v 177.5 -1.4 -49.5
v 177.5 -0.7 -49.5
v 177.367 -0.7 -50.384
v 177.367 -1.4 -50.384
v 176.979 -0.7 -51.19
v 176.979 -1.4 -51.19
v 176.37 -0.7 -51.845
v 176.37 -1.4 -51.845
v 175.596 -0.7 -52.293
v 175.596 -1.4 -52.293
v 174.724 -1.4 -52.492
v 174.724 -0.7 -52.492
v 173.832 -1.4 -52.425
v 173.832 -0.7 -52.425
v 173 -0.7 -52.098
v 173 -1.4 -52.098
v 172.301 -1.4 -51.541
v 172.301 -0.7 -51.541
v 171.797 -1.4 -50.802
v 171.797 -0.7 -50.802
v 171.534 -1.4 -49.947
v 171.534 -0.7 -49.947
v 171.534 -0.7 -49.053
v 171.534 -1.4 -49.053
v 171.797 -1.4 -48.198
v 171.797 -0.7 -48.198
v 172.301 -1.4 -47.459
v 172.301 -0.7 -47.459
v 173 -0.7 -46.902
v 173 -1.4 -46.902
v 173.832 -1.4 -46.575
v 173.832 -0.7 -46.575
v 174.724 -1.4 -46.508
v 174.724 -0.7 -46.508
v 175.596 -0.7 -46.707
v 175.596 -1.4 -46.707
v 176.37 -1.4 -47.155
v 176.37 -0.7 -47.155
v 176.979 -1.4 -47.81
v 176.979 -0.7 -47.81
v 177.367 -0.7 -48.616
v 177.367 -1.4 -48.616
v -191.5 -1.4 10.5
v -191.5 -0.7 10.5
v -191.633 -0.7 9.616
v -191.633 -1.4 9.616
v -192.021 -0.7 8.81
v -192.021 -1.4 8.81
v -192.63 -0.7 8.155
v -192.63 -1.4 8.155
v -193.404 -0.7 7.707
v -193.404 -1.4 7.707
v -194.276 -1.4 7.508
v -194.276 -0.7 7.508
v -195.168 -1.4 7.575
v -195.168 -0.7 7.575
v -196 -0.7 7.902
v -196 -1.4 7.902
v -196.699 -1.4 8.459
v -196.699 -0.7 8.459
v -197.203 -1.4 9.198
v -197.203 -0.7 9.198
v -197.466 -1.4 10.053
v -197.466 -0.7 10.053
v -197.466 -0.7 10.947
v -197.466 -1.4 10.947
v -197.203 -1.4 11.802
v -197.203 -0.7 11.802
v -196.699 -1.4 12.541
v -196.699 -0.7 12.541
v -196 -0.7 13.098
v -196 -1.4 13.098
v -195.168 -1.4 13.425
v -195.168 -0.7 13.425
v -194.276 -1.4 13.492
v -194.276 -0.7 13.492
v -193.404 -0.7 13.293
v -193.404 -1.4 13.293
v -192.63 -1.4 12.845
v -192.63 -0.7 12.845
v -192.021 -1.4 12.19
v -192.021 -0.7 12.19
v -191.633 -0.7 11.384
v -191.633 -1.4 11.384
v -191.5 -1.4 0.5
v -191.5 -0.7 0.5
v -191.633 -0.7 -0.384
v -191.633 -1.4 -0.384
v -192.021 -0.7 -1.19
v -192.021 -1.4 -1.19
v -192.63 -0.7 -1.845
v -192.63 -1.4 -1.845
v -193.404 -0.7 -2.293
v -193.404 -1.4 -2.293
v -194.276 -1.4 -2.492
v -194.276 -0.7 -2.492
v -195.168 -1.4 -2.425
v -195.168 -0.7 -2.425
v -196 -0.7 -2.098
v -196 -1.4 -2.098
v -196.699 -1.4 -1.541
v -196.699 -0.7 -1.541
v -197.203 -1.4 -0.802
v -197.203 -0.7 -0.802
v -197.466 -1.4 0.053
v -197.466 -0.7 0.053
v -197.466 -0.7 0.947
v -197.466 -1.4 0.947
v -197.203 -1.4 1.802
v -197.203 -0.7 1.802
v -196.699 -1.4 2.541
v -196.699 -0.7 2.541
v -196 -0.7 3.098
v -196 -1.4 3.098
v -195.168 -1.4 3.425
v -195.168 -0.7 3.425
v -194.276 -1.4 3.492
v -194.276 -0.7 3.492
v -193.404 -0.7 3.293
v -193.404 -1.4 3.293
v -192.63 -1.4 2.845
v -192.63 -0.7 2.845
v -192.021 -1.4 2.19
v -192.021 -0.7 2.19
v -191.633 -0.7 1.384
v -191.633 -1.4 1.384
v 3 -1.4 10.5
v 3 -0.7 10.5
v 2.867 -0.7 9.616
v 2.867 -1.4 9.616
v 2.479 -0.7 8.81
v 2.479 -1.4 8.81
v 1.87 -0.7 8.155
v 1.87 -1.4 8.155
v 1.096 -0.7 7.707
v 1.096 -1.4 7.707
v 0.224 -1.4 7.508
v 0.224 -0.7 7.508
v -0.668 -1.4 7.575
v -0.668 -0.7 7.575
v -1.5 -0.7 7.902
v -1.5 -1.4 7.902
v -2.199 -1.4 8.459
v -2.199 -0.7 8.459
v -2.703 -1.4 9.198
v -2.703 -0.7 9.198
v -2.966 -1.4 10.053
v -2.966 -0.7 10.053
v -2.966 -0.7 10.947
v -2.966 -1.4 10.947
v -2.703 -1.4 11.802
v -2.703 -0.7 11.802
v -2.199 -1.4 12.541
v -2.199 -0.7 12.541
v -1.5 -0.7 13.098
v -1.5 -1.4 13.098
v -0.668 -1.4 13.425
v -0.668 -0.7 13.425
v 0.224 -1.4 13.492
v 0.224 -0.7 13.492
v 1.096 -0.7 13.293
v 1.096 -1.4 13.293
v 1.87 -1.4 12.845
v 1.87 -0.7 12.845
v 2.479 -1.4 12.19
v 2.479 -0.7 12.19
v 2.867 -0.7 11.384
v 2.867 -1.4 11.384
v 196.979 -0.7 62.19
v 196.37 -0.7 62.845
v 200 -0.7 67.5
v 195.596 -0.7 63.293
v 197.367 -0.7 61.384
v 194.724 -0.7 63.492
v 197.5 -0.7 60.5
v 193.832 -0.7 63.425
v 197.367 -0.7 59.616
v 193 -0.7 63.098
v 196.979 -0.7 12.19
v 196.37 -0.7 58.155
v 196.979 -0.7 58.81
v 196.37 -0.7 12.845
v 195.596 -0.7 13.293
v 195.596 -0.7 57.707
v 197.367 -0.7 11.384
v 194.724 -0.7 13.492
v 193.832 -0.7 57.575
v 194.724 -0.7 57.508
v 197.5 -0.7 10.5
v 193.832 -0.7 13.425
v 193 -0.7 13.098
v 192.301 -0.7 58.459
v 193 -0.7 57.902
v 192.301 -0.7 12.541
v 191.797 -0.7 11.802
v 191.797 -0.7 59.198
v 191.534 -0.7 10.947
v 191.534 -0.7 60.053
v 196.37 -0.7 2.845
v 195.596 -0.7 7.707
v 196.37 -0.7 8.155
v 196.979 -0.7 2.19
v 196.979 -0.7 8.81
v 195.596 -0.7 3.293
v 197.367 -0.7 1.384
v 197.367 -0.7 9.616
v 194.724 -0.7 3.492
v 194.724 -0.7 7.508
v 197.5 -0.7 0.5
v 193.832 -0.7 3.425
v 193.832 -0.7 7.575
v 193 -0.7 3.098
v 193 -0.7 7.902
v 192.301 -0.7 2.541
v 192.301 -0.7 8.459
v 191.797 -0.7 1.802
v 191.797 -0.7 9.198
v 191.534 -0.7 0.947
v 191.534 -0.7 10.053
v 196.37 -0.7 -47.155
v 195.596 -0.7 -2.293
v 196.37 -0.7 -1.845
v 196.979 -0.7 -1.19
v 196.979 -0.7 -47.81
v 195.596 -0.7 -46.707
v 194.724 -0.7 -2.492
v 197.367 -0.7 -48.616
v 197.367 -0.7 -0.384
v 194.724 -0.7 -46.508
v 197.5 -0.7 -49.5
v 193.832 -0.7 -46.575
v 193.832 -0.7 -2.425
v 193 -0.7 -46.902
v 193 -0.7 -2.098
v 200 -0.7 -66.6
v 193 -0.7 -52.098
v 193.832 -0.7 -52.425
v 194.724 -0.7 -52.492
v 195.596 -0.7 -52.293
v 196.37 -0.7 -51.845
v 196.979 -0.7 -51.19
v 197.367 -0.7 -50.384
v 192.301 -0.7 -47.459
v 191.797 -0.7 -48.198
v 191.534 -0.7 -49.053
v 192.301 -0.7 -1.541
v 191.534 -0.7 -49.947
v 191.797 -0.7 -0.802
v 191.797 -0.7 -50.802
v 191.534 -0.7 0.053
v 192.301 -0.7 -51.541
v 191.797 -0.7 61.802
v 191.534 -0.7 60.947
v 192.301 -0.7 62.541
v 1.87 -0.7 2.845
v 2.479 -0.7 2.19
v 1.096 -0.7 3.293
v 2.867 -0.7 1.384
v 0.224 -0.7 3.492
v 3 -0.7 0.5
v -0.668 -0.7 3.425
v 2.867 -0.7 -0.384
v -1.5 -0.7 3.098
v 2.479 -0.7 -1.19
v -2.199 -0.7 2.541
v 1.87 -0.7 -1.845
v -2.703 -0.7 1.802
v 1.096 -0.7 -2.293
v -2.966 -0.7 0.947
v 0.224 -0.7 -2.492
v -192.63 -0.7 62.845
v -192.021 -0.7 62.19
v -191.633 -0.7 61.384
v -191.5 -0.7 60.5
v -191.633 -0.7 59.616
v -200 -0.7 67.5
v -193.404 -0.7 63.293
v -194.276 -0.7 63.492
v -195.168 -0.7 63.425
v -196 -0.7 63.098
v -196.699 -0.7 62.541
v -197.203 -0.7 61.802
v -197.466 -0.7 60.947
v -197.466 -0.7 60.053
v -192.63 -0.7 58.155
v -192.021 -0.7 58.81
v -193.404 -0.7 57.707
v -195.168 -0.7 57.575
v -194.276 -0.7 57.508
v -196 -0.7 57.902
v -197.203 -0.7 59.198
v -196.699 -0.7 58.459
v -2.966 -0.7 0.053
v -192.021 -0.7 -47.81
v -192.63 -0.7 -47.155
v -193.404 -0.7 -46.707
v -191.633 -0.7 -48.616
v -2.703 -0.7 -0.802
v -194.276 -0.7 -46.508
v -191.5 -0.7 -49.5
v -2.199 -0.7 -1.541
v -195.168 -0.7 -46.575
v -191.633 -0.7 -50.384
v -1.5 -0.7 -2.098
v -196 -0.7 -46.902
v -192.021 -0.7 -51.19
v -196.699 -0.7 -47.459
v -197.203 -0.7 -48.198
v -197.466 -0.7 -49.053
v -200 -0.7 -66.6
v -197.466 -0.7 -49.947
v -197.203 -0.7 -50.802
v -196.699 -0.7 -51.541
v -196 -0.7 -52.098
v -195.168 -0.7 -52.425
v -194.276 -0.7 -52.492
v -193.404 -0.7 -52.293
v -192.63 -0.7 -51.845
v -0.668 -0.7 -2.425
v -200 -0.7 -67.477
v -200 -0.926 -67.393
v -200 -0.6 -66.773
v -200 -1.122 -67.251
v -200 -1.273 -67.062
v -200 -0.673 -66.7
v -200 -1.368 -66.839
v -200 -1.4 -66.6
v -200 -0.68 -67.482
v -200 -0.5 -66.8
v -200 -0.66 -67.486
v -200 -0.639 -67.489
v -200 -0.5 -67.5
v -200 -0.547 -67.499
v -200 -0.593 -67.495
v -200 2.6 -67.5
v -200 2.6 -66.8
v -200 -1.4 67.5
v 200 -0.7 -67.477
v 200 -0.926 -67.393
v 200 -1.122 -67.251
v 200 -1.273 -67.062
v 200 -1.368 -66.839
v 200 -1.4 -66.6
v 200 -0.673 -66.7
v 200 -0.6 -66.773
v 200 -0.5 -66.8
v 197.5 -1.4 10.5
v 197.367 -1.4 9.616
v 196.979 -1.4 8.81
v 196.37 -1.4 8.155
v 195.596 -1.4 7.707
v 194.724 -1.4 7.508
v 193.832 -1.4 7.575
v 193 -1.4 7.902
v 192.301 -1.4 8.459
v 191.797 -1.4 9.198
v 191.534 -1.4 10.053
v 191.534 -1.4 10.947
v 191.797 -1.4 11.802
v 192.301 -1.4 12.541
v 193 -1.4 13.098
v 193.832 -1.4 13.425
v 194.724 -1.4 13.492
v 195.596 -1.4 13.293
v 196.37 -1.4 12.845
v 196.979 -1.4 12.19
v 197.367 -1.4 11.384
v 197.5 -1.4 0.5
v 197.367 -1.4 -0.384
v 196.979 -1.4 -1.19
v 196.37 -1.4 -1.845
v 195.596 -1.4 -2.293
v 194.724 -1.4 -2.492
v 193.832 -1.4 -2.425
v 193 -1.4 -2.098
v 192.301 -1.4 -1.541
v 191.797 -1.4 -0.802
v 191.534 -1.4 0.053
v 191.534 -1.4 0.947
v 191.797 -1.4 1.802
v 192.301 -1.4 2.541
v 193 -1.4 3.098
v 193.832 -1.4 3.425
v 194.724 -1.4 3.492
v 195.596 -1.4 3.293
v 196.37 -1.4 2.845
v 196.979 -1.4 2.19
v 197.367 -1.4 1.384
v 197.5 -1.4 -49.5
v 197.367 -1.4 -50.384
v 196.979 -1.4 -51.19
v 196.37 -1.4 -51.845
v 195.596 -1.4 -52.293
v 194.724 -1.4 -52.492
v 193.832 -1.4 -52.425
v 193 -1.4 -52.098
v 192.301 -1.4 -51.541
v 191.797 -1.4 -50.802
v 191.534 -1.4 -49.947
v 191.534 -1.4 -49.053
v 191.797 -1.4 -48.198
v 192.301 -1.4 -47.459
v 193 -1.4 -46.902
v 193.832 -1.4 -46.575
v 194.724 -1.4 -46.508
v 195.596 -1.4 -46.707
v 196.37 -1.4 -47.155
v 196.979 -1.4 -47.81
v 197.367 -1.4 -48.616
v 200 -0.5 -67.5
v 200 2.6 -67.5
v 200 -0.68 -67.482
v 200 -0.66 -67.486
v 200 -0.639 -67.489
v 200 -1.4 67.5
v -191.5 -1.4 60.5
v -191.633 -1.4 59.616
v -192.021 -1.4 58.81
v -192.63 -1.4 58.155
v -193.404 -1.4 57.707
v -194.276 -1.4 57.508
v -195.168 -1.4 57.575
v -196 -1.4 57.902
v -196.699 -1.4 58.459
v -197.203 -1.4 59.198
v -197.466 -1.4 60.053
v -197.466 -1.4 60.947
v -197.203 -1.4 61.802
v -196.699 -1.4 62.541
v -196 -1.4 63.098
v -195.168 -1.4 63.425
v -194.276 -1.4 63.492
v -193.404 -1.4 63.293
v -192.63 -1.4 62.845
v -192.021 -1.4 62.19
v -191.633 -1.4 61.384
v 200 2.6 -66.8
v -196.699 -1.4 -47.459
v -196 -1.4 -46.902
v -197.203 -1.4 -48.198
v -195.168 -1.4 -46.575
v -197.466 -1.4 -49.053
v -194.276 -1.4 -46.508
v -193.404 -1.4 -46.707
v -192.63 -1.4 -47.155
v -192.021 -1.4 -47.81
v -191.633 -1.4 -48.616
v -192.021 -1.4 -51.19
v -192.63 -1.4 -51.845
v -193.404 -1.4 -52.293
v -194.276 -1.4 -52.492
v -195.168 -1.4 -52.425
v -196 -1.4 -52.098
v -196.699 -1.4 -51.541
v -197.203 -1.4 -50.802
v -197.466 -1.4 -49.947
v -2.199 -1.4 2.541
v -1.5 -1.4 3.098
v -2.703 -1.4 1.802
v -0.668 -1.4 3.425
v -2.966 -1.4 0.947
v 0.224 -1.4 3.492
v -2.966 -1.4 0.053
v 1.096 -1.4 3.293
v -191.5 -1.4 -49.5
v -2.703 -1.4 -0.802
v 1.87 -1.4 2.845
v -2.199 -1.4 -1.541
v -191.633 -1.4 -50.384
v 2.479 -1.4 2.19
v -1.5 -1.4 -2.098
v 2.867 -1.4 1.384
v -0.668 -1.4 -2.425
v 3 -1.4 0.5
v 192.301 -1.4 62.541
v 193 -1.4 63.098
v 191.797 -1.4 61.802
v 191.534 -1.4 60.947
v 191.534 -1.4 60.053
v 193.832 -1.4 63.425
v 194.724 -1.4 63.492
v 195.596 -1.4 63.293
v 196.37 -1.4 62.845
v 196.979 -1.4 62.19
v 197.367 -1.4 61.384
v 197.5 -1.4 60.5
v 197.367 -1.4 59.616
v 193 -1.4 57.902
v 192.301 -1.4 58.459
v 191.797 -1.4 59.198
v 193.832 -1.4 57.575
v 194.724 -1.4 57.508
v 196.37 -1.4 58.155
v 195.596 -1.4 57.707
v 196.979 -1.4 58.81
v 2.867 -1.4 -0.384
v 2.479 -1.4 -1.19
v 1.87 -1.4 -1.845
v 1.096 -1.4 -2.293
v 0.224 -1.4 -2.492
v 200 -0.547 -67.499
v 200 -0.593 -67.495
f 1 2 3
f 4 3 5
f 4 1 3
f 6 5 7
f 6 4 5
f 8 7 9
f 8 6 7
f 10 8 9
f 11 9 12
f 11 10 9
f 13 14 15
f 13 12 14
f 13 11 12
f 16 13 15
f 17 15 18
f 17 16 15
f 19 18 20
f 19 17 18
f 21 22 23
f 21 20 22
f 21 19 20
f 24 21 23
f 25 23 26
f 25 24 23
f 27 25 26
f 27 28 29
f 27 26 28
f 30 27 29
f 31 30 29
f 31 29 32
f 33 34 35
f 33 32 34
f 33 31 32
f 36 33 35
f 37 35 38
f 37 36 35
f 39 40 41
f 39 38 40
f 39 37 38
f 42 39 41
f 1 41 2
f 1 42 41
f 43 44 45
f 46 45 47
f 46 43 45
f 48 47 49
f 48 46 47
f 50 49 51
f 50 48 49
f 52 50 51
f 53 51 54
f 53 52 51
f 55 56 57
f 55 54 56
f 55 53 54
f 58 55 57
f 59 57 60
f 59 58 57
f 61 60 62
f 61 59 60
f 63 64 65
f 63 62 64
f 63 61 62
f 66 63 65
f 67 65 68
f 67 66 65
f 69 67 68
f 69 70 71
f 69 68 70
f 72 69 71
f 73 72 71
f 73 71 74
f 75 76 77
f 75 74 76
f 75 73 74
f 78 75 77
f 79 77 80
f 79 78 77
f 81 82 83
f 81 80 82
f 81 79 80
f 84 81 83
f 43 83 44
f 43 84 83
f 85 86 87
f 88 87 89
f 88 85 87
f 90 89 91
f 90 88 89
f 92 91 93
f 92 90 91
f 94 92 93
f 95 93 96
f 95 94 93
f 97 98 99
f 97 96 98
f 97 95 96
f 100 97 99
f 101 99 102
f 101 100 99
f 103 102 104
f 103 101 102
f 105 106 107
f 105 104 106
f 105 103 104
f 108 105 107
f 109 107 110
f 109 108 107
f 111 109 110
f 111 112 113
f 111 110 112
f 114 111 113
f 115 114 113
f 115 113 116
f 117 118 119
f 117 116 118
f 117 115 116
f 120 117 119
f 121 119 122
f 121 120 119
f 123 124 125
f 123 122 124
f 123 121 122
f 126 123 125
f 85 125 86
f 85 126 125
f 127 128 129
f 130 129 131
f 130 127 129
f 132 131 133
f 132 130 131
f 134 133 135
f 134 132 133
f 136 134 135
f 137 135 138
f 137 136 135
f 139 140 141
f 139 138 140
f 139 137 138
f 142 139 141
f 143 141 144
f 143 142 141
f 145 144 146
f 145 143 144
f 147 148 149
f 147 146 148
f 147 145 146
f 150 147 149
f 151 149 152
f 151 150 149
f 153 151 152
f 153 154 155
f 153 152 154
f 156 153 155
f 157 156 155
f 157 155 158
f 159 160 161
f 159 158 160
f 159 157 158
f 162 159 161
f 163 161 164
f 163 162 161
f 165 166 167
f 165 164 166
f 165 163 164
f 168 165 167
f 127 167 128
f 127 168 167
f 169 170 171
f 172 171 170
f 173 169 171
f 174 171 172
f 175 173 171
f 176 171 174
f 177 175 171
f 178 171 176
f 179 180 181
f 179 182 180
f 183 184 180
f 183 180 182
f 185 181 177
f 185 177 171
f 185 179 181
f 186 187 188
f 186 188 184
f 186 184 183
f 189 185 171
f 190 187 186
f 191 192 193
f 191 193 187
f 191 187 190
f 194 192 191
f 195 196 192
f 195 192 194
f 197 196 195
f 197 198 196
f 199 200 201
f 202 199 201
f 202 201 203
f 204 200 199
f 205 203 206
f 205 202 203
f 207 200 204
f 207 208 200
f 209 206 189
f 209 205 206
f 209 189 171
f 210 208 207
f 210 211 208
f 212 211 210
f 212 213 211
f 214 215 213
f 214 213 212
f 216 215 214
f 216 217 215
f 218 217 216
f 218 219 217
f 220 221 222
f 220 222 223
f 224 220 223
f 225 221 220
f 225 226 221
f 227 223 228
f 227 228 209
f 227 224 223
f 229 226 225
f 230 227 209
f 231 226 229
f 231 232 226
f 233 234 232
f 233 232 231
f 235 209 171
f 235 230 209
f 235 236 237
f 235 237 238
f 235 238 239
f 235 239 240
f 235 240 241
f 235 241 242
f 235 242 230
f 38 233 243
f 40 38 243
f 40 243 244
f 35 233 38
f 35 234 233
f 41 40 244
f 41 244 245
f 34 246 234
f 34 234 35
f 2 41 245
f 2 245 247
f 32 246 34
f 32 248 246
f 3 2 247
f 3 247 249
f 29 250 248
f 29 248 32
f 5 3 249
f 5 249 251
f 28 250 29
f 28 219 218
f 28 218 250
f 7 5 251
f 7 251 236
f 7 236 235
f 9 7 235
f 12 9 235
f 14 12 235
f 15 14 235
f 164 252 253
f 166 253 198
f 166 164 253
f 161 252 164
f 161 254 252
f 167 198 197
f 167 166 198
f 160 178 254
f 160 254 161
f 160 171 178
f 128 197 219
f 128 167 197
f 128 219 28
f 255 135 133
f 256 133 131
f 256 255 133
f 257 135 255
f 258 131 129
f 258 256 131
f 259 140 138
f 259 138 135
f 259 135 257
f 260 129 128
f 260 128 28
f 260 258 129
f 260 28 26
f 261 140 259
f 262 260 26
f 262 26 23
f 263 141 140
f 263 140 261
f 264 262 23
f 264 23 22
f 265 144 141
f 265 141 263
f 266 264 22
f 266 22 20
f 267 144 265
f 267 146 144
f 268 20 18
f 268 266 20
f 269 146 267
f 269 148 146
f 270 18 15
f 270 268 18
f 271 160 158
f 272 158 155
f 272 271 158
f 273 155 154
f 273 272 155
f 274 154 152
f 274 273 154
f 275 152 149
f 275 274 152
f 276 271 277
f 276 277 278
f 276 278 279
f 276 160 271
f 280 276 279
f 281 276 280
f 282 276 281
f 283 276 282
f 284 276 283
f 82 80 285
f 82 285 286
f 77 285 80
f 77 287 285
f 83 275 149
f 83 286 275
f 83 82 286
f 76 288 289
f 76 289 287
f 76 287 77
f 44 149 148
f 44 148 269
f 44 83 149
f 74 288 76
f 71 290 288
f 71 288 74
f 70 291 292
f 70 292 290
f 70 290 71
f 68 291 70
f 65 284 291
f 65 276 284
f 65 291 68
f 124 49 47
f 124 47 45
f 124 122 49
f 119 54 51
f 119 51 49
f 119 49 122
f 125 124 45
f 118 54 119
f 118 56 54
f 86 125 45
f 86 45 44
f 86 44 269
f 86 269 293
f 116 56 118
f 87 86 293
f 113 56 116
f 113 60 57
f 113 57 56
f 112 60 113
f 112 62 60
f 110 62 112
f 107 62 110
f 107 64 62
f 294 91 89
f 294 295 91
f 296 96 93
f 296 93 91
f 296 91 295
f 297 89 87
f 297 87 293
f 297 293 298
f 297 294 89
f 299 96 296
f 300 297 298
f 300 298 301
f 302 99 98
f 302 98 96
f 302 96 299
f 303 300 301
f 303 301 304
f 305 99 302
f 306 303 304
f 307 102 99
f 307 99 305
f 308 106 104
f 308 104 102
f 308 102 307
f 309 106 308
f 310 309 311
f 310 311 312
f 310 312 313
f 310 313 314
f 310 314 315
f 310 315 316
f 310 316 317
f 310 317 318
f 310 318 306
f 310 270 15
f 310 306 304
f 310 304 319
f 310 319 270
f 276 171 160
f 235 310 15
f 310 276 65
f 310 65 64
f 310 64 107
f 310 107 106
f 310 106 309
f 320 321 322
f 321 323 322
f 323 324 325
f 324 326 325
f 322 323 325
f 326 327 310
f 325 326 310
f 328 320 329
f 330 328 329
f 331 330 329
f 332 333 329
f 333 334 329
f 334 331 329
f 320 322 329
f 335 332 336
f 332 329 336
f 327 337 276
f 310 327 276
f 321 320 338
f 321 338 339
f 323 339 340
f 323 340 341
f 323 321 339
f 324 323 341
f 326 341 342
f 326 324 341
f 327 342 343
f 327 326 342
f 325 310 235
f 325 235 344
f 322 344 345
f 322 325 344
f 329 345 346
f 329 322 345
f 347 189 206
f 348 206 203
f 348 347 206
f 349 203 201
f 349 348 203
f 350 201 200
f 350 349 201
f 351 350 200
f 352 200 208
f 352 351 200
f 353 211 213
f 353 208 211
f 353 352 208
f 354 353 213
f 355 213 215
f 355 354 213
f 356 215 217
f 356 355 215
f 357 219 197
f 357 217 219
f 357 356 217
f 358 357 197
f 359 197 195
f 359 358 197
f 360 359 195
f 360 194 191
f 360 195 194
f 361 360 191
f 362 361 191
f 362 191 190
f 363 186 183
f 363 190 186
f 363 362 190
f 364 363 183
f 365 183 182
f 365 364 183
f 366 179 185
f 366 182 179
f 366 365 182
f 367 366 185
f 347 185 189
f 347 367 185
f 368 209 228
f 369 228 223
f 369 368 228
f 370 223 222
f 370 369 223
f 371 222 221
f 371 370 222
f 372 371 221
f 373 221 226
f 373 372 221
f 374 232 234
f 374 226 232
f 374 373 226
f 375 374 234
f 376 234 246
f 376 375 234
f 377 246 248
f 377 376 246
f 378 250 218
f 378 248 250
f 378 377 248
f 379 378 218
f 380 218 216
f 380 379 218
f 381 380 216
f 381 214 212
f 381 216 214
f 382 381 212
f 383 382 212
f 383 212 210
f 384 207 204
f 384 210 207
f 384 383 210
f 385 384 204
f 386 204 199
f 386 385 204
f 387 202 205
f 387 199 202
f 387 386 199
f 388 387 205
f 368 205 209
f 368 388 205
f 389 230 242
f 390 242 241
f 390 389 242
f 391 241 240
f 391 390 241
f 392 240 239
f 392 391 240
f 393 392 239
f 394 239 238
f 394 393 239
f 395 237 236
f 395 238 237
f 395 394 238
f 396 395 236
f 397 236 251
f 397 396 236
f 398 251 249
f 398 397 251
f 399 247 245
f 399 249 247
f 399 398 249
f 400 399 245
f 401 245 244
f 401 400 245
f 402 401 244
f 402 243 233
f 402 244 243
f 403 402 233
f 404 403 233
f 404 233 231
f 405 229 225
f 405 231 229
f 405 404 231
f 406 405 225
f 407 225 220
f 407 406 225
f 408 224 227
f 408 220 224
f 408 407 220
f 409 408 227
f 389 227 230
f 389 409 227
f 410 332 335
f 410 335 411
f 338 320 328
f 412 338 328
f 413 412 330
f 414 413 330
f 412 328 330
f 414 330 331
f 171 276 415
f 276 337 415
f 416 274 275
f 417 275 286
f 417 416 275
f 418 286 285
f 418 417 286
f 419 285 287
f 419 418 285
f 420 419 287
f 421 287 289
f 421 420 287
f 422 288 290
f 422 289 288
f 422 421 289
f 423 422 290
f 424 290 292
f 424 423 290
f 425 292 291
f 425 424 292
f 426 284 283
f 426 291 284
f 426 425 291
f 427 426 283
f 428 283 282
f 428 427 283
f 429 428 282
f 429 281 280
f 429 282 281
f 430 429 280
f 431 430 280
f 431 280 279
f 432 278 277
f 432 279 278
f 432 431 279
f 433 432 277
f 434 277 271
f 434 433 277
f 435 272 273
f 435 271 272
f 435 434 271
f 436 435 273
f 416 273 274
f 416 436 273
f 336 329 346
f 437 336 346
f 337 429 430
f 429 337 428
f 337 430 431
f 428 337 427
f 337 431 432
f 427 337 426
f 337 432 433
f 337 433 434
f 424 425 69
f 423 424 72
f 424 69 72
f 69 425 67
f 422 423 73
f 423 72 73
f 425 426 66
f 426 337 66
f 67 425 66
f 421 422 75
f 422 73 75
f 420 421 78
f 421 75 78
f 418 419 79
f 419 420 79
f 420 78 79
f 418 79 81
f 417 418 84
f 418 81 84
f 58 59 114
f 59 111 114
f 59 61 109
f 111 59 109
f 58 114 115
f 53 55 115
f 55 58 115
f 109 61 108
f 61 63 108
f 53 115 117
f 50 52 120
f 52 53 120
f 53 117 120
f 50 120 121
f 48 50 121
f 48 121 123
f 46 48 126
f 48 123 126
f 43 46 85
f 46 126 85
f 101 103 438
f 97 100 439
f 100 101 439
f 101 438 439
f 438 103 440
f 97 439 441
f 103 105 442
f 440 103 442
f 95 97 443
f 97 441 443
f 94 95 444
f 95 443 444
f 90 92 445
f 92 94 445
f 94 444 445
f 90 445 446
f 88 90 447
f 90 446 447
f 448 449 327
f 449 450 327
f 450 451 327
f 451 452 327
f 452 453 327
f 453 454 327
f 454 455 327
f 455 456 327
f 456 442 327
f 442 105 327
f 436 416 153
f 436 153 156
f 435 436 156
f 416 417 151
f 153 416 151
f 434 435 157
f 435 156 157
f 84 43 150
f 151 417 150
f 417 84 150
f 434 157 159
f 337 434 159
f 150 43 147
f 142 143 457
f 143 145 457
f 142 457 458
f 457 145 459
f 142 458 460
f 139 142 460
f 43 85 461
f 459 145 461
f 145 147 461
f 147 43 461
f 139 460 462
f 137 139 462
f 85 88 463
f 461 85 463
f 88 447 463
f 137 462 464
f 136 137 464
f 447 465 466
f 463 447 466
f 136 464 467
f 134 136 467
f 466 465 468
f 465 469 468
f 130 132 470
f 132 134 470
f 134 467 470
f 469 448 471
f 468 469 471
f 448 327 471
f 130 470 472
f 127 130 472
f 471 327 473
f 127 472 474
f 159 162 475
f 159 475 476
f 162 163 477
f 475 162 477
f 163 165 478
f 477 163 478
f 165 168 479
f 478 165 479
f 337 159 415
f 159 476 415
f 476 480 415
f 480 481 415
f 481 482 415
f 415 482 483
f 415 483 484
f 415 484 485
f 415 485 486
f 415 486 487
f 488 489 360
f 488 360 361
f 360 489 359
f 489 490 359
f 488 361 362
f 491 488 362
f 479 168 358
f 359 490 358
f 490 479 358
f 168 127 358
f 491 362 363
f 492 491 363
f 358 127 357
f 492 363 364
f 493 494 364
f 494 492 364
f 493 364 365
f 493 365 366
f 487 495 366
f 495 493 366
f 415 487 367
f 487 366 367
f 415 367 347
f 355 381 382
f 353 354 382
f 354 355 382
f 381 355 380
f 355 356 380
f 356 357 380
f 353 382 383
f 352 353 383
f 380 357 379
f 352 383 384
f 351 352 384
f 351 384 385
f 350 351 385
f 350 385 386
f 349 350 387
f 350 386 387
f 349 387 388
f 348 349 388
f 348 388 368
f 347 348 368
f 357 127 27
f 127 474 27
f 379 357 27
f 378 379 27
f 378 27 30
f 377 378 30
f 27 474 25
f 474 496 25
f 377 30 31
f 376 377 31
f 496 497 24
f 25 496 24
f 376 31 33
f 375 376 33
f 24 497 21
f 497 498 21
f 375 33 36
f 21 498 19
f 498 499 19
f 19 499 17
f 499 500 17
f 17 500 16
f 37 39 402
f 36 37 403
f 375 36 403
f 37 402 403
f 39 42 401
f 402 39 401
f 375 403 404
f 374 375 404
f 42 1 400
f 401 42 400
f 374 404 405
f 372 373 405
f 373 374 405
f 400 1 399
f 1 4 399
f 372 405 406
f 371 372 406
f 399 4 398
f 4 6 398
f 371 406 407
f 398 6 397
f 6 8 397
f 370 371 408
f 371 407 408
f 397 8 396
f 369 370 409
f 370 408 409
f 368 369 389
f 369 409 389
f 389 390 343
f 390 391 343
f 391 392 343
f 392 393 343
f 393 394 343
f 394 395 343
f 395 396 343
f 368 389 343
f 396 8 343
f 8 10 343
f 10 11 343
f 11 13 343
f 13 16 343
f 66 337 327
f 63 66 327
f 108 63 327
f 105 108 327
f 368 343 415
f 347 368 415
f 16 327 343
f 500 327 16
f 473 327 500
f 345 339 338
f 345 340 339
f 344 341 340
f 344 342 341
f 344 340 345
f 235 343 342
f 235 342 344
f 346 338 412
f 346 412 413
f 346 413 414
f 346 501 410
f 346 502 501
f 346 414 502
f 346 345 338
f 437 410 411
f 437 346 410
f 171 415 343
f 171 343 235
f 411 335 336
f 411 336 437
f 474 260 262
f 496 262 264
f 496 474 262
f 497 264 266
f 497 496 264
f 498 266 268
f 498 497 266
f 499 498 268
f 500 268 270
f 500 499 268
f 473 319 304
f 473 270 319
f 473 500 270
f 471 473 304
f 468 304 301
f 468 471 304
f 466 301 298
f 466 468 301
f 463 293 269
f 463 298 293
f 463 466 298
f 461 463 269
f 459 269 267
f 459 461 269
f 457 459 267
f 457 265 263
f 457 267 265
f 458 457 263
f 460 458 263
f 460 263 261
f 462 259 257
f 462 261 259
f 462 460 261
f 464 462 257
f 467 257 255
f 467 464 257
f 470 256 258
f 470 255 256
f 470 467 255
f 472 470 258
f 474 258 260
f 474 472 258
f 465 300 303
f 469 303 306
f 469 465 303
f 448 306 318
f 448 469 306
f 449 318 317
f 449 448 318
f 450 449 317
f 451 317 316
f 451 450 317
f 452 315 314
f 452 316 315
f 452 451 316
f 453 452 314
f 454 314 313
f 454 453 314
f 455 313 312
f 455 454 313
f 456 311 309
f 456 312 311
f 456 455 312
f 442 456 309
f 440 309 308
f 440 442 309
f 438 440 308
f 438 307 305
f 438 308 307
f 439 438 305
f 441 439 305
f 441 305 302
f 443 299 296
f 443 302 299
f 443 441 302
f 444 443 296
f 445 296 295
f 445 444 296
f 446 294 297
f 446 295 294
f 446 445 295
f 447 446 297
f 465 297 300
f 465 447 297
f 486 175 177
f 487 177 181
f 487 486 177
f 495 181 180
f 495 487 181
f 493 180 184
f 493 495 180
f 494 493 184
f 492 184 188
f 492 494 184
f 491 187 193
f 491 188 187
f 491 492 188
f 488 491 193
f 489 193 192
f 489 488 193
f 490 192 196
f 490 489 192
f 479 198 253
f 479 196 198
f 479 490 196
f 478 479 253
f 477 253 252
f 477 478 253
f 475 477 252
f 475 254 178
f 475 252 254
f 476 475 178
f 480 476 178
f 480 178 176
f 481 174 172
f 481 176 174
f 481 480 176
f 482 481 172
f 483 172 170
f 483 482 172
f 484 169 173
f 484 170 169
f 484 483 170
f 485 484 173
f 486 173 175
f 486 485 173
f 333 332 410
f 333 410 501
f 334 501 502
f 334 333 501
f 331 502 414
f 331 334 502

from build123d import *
from build123d.topology import SkipClean

# Parameters (mm, degrees)
SKETCH_1_W                       = 400
SKETCH_1_H                       = 135
SKETCH_1_R                       = 3
SM_BASE_FLANGE_1_DEPTH           = 0.7
SM_EDGE_FLANGE_1_STRIP_W         = 3.2
SM_EDGE_FLANGE_1_STRIP_H         = 0.7
SM_EDGE_FLANGE_1_STRIP_CUT_DEPTH = 400
SM_EDGE_FLANGE_1_DEPTH           = 400
MOVE_START                       = -0.5
MOVE_BODY_1_OUTLINE_W            = 400
MOVE_BODY_1_OUTLINE_H            = 134.3
MOVE_BODY_1_OUTLINE_R            = 3
MOVE_BODY_1_DEPTH                = 0.5
MOVE_START_2                     = -4
MOVE_BODY_1_2_OUTLINE_W          = 400
MOVE_BODY_1_2_OUTLINE_H          = 0.7
MOVE_BODY_1_2_DEPTH              = 2.6
MOVE_START_3                     = -1.315058
MOVE_BODY_1_3_OUTLINE_W          = 400
MOVE_BODY_1_3_OUTLINE_H          = 134.3
MOVE_BODY_1_3_OUTLINE_R          = 3
MOVE_BODY_1_3_DEPTH              = 0.615058
MOVE_BODY_1_4_OUTLINE_W          = 400
MOVE_BODY_1_4_OUTLINE_H          = 0.7
MOVE_BODY_1_4_DEPTH              = 3.1
MOVE_START_4                     = -1.4
MOVE_BODY_1_5_OUTLINE_W          = 400
MOVE_BODY_1_5_OUTLINE_H          = 134.3
MOVE_BODY_1_5_OUTLINE_R          = 3
MOVE_BODY_1_5_DEPTH              = 0.084942
MOVE_START_5                     = -0.639415385
MOVE_BODY_1_6_OUTLINE_W          = 400
MOVE_BODY_1_6_OUTLINE_H          = 0.7
MOVE_BODY_1_6_DEPTH              = 0.139415385
MOVE_START_6                     = -200
MOVE_BODY_1_7_DEPTH              = 400
MOVE_BODY_1_8_DEPTH              = 400


with BuildPart() as part:
    # 基体-法兰1: sheet metal written as solids
    # 草图1 → 基体-法兰1 (new body)
    with BuildSketch(Plane(origin=(0, 0, 0), x_dir=(1, 0, 0), z_dir=(0, 1, 0))):
        Rectangle(SKETCH_1_W, SKETCH_1_H)
        with Locations(Location((-194.5, -60.5, 0), (0, 0, 270))):
            Circle(SKETCH_1_R, mode=Mode.SUBTRACT)
        with Locations(Location((-194.5, -10.5, 0), (0, 0, 270))):
            Circle(SKETCH_1_R, mode=Mode.SUBTRACT)
        with Locations(Location((-194.5, -0.5, 0), (0, 0, 270))):
            Circle(SKETCH_1_R, mode=Mode.SUBTRACT)
        with Locations(Location((-194.5, 49.5, 0), (0, 0, 270))):
            Circle(SKETCH_1_R, mode=Mode.SUBTRACT)
        with Locations(Location((0, -10.5, 0), (0, 0, 270))):
            Circle(SKETCH_1_R, mode=Mode.SUBTRACT)
        with Locations(Location((0, -0.5, 0), (0, 0, 270))):
            Circle(SKETCH_1_R, mode=Mode.SUBTRACT)
        with Locations(Location((194.5, -60.5, 0), (0, 0, 90))):
            Circle(SKETCH_1_R, mode=Mode.SUBTRACT)
        with Locations(Location((194.5, -10.5, 0), (0, 0, 90))):
            Circle(SKETCH_1_R, mode=Mode.SUBTRACT)
        with Locations(Location((194.5, -0.5, 0), (0, 0, 90))):
            Circle(SKETCH_1_R, mode=Mode.SUBTRACT)
        with Locations(Location((194.5, 49.5, 0), (0, 0, 90))):
            Circle(SKETCH_1_R, mode=Mode.SUBTRACT)
        with Locations(Location((174.5, 49.5, 0), (0, 0, 270))):
            Circle(SKETCH_1_R, mode=Mode.SUBTRACT)
    extrude(amount=-SM_BASE_FLANGE_1_DEPTH)

    # 边线-法兰1: sheet metal written as solids
    # 边线-法兰1 strip (on a plane across the edge) → 边线-法兰1 strip cut (cut)
    with BuildSketch(Plane(origin=(-200, -0.7, -67.5), x_dir=(0, 0, 1), z_dir=(1, 0, 0))):
        with Locations((-0.7, -0.35)):
            Rectangle(SM_EDGE_FLANGE_1_STRIP_W, SM_EDGE_FLANGE_1_STRIP_H)
    extrude(amount=SM_EDGE_FLANGE_1_STRIP_CUT_DEPTH, mode=Mode.SUBTRACT)

    # 边线-法兰1 section (on a plane across the edge) → 边线-法兰1 (add)
    with BuildSketch(Plane(origin=(-200, -0.7, -67.5), x_dir=(0, 0, 1), z_dir=(1, 0, 0))):
        with BuildLine():
            Line((0, 0.2), (0, 3.3))
            Line((0, 3.3), (0.7, 3.3))
            Line((0.7, 3.3), (0.7, 0.2))
            ThreePointArc((0.7, 0.2), (0.758578644, 0.058578644), (0.9, 0))
            Line((0.9, 0), (0.9, -0.7))
            ThreePointArc((0.9, -0.7), (0.263603897, -0.436396103), (0, 0.2))
        make_face()
    extrude(amount=SM_EDGE_FLANGE_1_DEPTH)

    # Move Body 1: read off the stored shape, not the designer's step
    # Move Body 1 outline → Move Body 1 (cut)
    with BuildSketch(Plane(origin=(0, 0, 0), x_dir=(1, 0, 0), z_dir=(0, 1, 0)).offset(MOVE_START)):
        with Locations((0, -0.35)):
            Rectangle(MOVE_BODY_1_OUTLINE_W, MOVE_BODY_1_OUTLINE_H)
        with Locations((-194.5, -60.5)):
            Circle(MOVE_BODY_1_OUTLINE_R, mode=Mode.SUBTRACT)
        with Locations((-194.5, -10.5)):
            Circle(MOVE_BODY_1_OUTLINE_R, mode=Mode.SUBTRACT)
        with Locations((-194.5, -0.5)):
            Circle(MOVE_BODY_1_OUTLINE_R, mode=Mode.SUBTRACT)
        with Locations((194.5, -60.5)):
            Circle(MOVE_BODY_1_OUTLINE_R, mode=Mode.SUBTRACT)
        with Locations((0, -10.5)):
            Circle(MOVE_BODY_1_OUTLINE_R, mode=Mode.SUBTRACT)
        with Locations((0, -0.5)):
            Circle(MOVE_BODY_1_OUTLINE_R, mode=Mode.SUBTRACT)
        with Locations((194.5, -10.5)):
            Circle(MOVE_BODY_1_OUTLINE_R, mode=Mode.SUBTRACT)
        with Locations((194.5, -0.5)):
            Circle(MOVE_BODY_1_OUTLINE_R, mode=Mode.SUBTRACT)
        with Locations((-194.5, 49.5)):
            Circle(MOVE_BODY_1_OUTLINE_R, mode=Mode.SUBTRACT)
        with Locations((174.5, 49.5)):
            Circle(MOVE_BODY_1_OUTLINE_R, mode=Mode.SUBTRACT)
        with Locations((194.5, 49.5)):
            Circle(MOVE_BODY_1_OUTLINE_R, mode=Mode.SUBTRACT)
    extrude(amount=MOVE_BODY_1_DEPTH, mode=Mode.SUBTRACT)

    # Move Body 1 2 outline → Move Body 1 2 (cut)
    with BuildSketch(Plane(origin=(0, 0, 0), x_dir=(1, 0, 0), z_dir=(0, 1, 0)).offset(MOVE_START_2)):
        with Locations((0, 67.15)):
            Rectangle(MOVE_BODY_1_2_OUTLINE_W, MOVE_BODY_1_2_OUTLINE_H)
    extrude(amount=MOVE_BODY_1_2_DEPTH, mode=Mode.SUBTRACT)

    # Move Body 1 3 outline → Move Body 1 3 (add)
    with SkipClean():  # the faces are left unmerged after this step: merging them gives an invalid solid
        with BuildSketch(Plane(origin=(0, 0, 0), x_dir=(1, 0, 0), z_dir=(0, 1, 0)).offset(MOVE_START_3)):
            with Locations((0, -0.35)):
                Rectangle(MOVE_BODY_1_3_OUTLINE_W, MOVE_BODY_1_3_OUTLINE_H)
            with Locations((-194.5, -60.5)):
                Circle(MOVE_BODY_1_3_OUTLINE_R, mode=Mode.SUBTRACT)
            with Locations((-194.5, -10.5)):
                Circle(MOVE_BODY_1_3_OUTLINE_R, mode=Mode.SUBTRACT)
            with Locations((-194.5, -0.5)):
                Circle(MOVE_BODY_1_3_OUTLINE_R, mode=Mode.SUBTRACT)
            with Locations((194.5, -60.5)):
                Circle(MOVE_BODY_1_3_OUTLINE_R, mode=Mode.SUBTRACT)
            with Locations((0, -10.5)):
                Circle(MOVE_BODY_1_3_OUTLINE_R, mode=Mode.SUBTRACT)
            with Locations((0, -0.5)):
                Circle(MOVE_BODY_1_3_OUTLINE_R, mode=Mode.SUBTRACT)
            with Locations((194.5, -10.5)):
                Circle(MOVE_BODY_1_3_OUTLINE_R, mode=Mode.SUBTRACT)
            with Locations((194.5, -0.5)):
                Circle(MOVE_BODY_1_3_OUTLINE_R, mode=Mode.SUBTRACT)
            with Locations((-194.5, 49.5)):
                Circle(MOVE_BODY_1_3_OUTLINE_R, mode=Mode.SUBTRACT)
            with Locations((174.5, 49.5)):
                Circle(MOVE_BODY_1_3_OUTLINE_R, mode=Mode.SUBTRACT)
            with Locations((194.5, 49.5)):
                Circle(MOVE_BODY_1_3_OUTLINE_R, mode=Mode.SUBTRACT)
        extrude(amount=MOVE_BODY_1_3_DEPTH)

    # Move Body 1 4 outline → Move Body 1 4 (add)
    with SkipClean():  # the faces are left unmerged after this step: merging them gives an invalid solid
        with BuildSketch(Plane(origin=(0, 0, 0), x_dir=(1, 0, 0), z_dir=(0, 1, 0)).offset(MOVE_START)):
            with Locations((0, 67.15)):
                Rectangle(MOVE_BODY_1_4_OUTLINE_W, MOVE_BODY_1_4_OUTLINE_H)
        extrude(amount=MOVE_BODY_1_4_DEPTH)

    # Move Body 1 5 outline → Move Body 1 5 (add)
    with SkipClean():  # the faces are left unmerged after this step: merging them gives an invalid solid
        with BuildSketch(Plane(origin=(0, 0, 0), x_dir=(1, 0, 0), z_dir=(0, 1, 0)).offset(MOVE_START_4)):
            with Locations((0, -0.35)):
                Rectangle(MOVE_BODY_1_5_OUTLINE_W, MOVE_BODY_1_5_OUTLINE_H)
            with Locations((-194.5, -60.5)):
                Circle(MOVE_BODY_1_5_OUTLINE_R, mode=Mode.SUBTRACT)
            with Locations((-194.5, -10.5)):
                Circle(MOVE_BODY_1_5_OUTLINE_R, mode=Mode.SUBTRACT)
            with Locations((-194.5, -0.5)):
                Circle(MOVE_BODY_1_5_OUTLINE_R, mode=Mode.SUBTRACT)
            with Locations((194.5, -60.5)):
                Circle(MOVE_BODY_1_5_OUTLINE_R, mode=Mode.SUBTRACT)
            with Locations((0, -10.5)):
                Circle(MOVE_BODY_1_5_OUTLINE_R, mode=Mode.SUBTRACT)
            with Locations((0, -0.5)):
                Circle(MOVE_BODY_1_5_OUTLINE_R, mode=Mode.SUBTRACT)
            with Locations((194.5, -10.5)):
                Circle(MOVE_BODY_1_5_OUTLINE_R, mode=Mode.SUBTRACT)
            with Locations((194.5, -0.5)):
                Circle(MOVE_BODY_1_5_OUTLINE_R, mode=Mode.SUBTRACT)
            with Locations((-194.5, 49.5)):
                Circle(MOVE_BODY_1_5_OUTLINE_R, mode=Mode.SUBTRACT)
            with Locations((174.5, 49.5)):
                Circle(MOVE_BODY_1_5_OUTLINE_R, mode=Mode.SUBTRACT)
            with Locations((194.5, 49.5)):
                Circle(MOVE_BODY_1_5_OUTLINE_R, mode=Mode.SUBTRACT)
        extrude(amount=MOVE_BODY_1_5_DEPTH)

    # Move Body 1 6 outline → Move Body 1 6 (add)
    with SkipClean():  # the faces are left unmerged after this step: merging them gives an invalid solid
        with BuildSketch(Plane(origin=(0, 0, 0), x_dir=(1, 0, 0), z_dir=(0, 1, 0)).offset(MOVE_START_5)):
            with Locations((0, 67.15)):
                Rectangle(MOVE_BODY_1_6_OUTLINE_W, MOVE_BODY_1_6_OUTLINE_H)
        extrude(amount=MOVE_BODY_1_6_DEPTH)

    # Move Body 1 7 outline → Move Body 1 7 (cut)
    with BuildSketch(Plane.YZ.offset(MOVE_START_6)):
        with BuildLine():
            Line((-0.5, 67.5), (-0.7, 67.5))
            Line((-0.7, 67.5), (-0.7, -66.6))
            ThreePointArc((-0.7, -66.6), (-0.641421356, -66.741421356), (-0.5, -66.8))
            Line((-0.5, -66.8), (-0.5, 67.5))
        make_face()
        with BuildLine():
            ThreePointArc((-0.5, -67.5), (-0.569919006, -67.497279963), (-0.639415385, -67.489136295))
            Line((-0.639415385, -67.489136295), (-0.639415385, -67.5))
            Line((-0.639415385, -67.5), (-0.5, -67.5))
        make_face()
        with BuildLine():
            ThreePointArc((-0.7, -67.477496439), (-1.203562364, -67.161248608), (-1.4, -66.6))
            Line((-1.4, -66.6), (-1.4, -67.5))
            Line((-1.4, -67.5), (-0.9, -67.5))
            ThreePointArc((-0.9, -67.5), (-0.799368978, -67.494356415), (-0.7, -67.477496439))
        make_face()
    extrude(amount=MOVE_BODY_1_7_DEPTH, mode=Mode.SUBTRACT)

    # Move Body 1 8 outline → Move Body 1 8 (add)
    with BuildSketch(Plane.YZ.offset(MOVE_START_6)):
        with BuildLine():
            ThreePointArc((-0.639415385, -67.461449742), (-0.669567969, -67.47000062), (-0.7, -67.477496439))
            ThreePointArc((-0.7, -67.477496439), (-0.669807457, -67.483835634), (-0.639415385, -67.489136295))
            Line((-0.639415385, -67.489136295), (-0.639415385, -67.461449742))
        make_face()
    extrude(amount=MOVE_BODY_1_8_DEPTH)


solid = part.part
